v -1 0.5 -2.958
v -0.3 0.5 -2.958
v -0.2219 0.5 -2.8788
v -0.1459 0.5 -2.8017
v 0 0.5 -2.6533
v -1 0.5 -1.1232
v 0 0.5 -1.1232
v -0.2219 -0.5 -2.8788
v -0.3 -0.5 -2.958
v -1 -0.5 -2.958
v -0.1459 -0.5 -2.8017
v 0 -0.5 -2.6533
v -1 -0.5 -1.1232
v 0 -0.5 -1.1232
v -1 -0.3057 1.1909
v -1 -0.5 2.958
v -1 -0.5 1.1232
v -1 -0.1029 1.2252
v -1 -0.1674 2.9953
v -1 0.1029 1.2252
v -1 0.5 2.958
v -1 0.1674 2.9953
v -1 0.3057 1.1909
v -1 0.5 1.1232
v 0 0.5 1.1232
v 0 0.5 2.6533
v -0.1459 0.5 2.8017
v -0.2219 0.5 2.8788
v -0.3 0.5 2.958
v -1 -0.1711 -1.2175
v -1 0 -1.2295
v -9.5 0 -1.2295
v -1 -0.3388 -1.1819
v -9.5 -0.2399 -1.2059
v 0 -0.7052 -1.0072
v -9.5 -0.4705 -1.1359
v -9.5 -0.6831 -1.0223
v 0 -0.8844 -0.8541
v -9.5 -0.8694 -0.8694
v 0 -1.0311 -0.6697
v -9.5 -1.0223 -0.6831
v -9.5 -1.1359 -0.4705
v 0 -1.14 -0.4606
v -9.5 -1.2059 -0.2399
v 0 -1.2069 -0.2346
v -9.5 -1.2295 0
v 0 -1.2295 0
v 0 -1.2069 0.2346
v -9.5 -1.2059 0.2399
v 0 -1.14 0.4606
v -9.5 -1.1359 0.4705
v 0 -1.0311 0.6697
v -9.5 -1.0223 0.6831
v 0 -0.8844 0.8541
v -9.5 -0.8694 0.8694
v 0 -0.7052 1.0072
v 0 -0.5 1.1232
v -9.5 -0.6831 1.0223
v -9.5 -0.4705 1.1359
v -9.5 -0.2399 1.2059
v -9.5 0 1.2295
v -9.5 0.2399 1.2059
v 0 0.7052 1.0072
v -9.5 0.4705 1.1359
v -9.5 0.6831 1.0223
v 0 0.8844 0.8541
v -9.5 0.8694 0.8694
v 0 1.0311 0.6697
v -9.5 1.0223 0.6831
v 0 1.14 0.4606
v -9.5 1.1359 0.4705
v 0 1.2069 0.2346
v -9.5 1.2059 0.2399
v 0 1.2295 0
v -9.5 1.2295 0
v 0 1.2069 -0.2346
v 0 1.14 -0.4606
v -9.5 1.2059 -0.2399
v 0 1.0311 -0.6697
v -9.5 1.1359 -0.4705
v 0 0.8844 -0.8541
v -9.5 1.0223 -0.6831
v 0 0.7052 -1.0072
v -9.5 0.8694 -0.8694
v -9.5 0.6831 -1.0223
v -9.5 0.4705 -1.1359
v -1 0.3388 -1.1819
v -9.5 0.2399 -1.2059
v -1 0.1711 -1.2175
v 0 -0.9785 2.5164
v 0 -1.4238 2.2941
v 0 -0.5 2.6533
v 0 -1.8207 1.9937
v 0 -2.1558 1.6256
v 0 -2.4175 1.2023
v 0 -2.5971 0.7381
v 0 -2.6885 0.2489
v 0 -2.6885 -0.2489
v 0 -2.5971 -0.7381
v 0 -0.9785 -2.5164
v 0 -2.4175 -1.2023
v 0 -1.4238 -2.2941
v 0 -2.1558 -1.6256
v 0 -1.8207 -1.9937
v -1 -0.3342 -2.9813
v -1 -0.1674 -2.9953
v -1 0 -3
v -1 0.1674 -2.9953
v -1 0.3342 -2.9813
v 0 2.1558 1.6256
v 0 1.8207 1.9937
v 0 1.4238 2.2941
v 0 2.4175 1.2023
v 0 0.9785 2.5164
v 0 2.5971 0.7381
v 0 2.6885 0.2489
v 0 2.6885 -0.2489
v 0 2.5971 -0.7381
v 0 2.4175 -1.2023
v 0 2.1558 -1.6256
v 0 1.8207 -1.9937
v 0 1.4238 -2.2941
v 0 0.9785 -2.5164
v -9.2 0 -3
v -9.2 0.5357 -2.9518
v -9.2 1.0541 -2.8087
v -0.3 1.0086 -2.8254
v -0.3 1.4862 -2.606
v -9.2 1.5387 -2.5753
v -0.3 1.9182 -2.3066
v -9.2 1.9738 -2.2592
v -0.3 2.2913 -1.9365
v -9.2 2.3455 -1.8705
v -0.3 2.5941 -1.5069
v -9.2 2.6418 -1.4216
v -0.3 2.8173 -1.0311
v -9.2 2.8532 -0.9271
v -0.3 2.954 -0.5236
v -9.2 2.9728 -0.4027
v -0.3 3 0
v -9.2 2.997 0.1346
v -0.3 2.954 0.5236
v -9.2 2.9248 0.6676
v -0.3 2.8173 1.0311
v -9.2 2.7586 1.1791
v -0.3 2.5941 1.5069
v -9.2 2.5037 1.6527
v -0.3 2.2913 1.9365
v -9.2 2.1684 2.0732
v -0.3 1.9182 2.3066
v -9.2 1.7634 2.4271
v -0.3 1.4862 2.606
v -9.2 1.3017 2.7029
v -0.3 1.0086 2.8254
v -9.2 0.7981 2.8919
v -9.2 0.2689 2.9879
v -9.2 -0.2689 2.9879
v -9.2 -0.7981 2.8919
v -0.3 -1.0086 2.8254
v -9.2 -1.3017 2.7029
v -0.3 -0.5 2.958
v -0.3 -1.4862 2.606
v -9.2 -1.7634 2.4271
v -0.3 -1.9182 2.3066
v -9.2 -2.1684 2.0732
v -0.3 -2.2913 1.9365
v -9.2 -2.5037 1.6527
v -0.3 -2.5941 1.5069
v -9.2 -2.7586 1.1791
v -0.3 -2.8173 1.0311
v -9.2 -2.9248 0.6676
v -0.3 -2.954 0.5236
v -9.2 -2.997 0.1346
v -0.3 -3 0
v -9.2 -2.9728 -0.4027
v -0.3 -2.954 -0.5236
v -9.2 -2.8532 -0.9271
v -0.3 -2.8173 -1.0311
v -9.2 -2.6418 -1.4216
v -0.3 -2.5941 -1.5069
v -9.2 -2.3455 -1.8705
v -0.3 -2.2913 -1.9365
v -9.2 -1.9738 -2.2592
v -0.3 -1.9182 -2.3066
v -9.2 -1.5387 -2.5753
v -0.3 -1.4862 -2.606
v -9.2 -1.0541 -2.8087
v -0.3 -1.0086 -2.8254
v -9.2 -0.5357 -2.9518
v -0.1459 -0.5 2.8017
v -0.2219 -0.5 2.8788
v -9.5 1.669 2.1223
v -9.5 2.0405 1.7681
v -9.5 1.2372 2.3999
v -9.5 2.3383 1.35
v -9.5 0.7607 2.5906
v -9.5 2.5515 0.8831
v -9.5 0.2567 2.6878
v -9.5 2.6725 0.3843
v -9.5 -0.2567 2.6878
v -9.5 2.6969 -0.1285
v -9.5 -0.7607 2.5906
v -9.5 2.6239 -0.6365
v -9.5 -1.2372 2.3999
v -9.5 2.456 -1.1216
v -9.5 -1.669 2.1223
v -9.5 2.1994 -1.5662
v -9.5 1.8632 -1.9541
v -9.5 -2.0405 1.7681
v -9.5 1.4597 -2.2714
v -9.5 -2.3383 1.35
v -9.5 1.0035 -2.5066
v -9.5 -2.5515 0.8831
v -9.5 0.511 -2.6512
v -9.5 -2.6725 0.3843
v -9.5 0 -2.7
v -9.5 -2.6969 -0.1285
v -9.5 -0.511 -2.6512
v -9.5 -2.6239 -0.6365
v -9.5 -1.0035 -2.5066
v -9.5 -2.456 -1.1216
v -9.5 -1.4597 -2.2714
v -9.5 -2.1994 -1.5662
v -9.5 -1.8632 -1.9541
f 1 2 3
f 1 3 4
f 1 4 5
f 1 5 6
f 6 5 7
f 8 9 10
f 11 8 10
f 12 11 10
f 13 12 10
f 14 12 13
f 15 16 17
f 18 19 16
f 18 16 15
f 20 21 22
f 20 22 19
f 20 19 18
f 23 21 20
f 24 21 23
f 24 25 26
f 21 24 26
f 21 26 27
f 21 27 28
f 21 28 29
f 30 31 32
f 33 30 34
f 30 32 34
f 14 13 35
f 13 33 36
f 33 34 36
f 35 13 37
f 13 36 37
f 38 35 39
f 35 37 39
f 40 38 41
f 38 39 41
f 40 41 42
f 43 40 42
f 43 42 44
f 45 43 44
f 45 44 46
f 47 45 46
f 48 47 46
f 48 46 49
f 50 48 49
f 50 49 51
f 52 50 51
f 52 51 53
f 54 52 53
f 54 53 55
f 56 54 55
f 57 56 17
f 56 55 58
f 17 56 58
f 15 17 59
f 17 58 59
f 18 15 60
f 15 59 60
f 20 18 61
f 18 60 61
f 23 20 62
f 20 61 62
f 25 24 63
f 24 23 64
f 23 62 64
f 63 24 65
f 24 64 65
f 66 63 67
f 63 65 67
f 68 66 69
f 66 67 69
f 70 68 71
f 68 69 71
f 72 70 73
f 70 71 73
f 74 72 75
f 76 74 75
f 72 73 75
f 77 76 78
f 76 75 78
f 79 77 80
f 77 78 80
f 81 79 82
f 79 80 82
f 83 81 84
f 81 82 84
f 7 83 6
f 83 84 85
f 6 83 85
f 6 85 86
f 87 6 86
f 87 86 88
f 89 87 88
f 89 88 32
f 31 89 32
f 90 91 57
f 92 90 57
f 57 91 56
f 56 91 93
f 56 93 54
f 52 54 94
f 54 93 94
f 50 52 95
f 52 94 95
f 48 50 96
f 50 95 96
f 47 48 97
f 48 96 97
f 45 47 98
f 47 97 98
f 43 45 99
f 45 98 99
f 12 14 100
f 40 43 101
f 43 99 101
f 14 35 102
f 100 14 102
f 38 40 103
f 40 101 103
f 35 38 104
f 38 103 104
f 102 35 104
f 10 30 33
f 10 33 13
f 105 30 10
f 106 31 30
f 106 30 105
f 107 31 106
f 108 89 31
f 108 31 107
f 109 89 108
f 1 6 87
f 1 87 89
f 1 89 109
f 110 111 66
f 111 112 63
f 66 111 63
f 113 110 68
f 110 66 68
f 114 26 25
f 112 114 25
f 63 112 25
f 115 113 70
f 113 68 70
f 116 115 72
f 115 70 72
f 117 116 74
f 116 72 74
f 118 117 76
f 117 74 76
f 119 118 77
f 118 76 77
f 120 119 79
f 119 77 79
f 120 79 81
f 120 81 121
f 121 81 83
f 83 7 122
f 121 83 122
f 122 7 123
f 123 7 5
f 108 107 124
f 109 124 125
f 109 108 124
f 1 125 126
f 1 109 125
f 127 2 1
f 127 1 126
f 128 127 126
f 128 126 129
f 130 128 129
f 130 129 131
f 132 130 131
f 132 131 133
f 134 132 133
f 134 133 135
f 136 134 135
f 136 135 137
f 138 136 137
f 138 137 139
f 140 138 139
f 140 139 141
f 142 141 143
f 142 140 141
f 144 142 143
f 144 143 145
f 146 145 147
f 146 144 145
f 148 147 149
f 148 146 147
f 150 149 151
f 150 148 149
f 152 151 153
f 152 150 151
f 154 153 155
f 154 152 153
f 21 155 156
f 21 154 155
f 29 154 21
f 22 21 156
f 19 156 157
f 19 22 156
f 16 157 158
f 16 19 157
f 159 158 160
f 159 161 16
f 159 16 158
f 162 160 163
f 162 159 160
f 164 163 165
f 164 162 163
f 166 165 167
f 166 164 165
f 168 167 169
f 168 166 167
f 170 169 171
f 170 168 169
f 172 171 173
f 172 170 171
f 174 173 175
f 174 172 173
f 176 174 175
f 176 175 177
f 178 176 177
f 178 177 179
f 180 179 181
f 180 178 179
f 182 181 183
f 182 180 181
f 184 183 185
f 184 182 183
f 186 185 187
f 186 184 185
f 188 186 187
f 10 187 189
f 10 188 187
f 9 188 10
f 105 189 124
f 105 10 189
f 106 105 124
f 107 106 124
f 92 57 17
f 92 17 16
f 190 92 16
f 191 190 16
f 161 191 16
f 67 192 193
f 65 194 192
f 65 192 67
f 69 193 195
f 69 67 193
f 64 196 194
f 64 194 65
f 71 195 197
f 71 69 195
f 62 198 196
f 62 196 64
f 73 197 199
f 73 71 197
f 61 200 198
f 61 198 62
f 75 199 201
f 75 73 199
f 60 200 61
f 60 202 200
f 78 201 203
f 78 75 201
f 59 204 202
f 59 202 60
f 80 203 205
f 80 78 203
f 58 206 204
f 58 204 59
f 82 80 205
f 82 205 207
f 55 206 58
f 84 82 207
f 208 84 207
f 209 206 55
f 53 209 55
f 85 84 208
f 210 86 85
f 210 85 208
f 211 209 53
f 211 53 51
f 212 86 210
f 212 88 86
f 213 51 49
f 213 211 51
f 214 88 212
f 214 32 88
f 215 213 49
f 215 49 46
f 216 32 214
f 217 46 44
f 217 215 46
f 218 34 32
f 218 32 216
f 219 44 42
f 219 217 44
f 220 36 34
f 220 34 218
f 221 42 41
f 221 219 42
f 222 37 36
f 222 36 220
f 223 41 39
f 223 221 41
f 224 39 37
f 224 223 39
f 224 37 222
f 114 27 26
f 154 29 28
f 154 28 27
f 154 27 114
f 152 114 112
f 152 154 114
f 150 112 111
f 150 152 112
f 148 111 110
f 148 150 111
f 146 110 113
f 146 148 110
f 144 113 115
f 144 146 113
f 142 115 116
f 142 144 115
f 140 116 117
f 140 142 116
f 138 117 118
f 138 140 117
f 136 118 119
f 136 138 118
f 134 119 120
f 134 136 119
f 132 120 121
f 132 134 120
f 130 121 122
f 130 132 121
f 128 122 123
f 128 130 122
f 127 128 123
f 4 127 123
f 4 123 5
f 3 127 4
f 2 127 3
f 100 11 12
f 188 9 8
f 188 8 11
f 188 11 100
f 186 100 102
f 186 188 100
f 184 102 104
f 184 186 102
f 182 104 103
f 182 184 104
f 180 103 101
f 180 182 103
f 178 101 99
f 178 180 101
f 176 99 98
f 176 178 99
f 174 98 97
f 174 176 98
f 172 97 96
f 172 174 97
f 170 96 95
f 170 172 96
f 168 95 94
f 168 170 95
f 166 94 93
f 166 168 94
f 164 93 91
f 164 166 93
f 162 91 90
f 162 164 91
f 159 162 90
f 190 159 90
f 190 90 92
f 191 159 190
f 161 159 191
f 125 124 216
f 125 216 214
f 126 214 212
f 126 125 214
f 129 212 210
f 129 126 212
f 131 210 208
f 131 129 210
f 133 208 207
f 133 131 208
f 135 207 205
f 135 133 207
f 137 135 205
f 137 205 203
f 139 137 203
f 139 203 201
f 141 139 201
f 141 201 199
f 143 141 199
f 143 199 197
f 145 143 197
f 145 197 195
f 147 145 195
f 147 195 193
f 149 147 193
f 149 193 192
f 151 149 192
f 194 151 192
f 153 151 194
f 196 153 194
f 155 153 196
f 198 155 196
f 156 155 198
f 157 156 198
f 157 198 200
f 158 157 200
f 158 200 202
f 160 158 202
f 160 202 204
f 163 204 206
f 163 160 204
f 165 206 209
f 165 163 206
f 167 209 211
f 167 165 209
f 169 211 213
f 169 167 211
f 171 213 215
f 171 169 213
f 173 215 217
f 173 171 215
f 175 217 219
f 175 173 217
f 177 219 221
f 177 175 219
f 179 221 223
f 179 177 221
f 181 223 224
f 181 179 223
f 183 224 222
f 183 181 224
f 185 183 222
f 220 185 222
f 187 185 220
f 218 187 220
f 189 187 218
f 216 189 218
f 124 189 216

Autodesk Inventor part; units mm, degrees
ref_plane "YZ Plane" through (0, 0, 0) normal (1, 0, 0) x (0, 1, 0)
ref_plane "XZ Plane" through (0, 0, 0) normal (0, 1, 0) x (-1, 0, 0)
ref_plane "XY Plane" through (0, 0, 0) normal (0, 0, 1) x (1, 0, 0)
sketch "スケッチ1" plane through (0, 0, 0) normal (0, 1, 0) x (-1, 0, 0)
  line L0 (0, 0) -> (9.5, 0)
  line L1 (9.5, 0) -> (9.5, -3)
  line L2 (9.5, -3) -> (0, -3)
  line L3 (0, -3) -> (0, 0)
  dimension "d0" = 9.5
  dimension "d1" = 3
revolve "回転1" add sketch "スケッチ1" angle 360 about axis through (0, 0, 0) along (-1, 0, 0)
sketch "スケッチ2" plane through (0, 0, 0) normal (1, 0, 0) x (0, 0, -1)
  point P0 (0, 0)
  point P1 (0, 0)
hole "穴1" at (0, 0, 0) direction (-1, 0, 0) diameter 2.459 end through all thread size "M3x0.5" class "6H" standard "ANSI Metric M Profile"
sketch "スケッチ3" plane through (0, 0, 0) normal (1, 0, 0) x (0, 0, -1)
  circle A0 centre (0, 0) radius 3 projected
  line L0 (3, 0) -> (-3, 0)
  line L1 (3, -0.5) -> (-3, -0.5)
  line L2 (3, 0.5) -> (-3, 0.5)
  line L3 (3, 0.5) -> (3, -0.5)
  line L4 (-3, 0.5) -> (-3, -0.5)
  point P0 (-2.958, -0.5)
  point P1 (2.958, -0.5)
  point P2 (2.958, 0.5)
  point P3 (-2.958, 0.5)
  dimension "d10" = 0.5
extrude "押し出し1" cut sketch "スケッチ3" against normal blind 1 contours L0 A0 L2 | A0 L1 L0
chamfer "面取り1" distance 0.3 angle 45 3 edges at (-9.5, 0, 3) (0, 3, 0) (0, -3, 0)
properties part number "ARU-309_5S" material "ステンレス鋼 AISI 304"
